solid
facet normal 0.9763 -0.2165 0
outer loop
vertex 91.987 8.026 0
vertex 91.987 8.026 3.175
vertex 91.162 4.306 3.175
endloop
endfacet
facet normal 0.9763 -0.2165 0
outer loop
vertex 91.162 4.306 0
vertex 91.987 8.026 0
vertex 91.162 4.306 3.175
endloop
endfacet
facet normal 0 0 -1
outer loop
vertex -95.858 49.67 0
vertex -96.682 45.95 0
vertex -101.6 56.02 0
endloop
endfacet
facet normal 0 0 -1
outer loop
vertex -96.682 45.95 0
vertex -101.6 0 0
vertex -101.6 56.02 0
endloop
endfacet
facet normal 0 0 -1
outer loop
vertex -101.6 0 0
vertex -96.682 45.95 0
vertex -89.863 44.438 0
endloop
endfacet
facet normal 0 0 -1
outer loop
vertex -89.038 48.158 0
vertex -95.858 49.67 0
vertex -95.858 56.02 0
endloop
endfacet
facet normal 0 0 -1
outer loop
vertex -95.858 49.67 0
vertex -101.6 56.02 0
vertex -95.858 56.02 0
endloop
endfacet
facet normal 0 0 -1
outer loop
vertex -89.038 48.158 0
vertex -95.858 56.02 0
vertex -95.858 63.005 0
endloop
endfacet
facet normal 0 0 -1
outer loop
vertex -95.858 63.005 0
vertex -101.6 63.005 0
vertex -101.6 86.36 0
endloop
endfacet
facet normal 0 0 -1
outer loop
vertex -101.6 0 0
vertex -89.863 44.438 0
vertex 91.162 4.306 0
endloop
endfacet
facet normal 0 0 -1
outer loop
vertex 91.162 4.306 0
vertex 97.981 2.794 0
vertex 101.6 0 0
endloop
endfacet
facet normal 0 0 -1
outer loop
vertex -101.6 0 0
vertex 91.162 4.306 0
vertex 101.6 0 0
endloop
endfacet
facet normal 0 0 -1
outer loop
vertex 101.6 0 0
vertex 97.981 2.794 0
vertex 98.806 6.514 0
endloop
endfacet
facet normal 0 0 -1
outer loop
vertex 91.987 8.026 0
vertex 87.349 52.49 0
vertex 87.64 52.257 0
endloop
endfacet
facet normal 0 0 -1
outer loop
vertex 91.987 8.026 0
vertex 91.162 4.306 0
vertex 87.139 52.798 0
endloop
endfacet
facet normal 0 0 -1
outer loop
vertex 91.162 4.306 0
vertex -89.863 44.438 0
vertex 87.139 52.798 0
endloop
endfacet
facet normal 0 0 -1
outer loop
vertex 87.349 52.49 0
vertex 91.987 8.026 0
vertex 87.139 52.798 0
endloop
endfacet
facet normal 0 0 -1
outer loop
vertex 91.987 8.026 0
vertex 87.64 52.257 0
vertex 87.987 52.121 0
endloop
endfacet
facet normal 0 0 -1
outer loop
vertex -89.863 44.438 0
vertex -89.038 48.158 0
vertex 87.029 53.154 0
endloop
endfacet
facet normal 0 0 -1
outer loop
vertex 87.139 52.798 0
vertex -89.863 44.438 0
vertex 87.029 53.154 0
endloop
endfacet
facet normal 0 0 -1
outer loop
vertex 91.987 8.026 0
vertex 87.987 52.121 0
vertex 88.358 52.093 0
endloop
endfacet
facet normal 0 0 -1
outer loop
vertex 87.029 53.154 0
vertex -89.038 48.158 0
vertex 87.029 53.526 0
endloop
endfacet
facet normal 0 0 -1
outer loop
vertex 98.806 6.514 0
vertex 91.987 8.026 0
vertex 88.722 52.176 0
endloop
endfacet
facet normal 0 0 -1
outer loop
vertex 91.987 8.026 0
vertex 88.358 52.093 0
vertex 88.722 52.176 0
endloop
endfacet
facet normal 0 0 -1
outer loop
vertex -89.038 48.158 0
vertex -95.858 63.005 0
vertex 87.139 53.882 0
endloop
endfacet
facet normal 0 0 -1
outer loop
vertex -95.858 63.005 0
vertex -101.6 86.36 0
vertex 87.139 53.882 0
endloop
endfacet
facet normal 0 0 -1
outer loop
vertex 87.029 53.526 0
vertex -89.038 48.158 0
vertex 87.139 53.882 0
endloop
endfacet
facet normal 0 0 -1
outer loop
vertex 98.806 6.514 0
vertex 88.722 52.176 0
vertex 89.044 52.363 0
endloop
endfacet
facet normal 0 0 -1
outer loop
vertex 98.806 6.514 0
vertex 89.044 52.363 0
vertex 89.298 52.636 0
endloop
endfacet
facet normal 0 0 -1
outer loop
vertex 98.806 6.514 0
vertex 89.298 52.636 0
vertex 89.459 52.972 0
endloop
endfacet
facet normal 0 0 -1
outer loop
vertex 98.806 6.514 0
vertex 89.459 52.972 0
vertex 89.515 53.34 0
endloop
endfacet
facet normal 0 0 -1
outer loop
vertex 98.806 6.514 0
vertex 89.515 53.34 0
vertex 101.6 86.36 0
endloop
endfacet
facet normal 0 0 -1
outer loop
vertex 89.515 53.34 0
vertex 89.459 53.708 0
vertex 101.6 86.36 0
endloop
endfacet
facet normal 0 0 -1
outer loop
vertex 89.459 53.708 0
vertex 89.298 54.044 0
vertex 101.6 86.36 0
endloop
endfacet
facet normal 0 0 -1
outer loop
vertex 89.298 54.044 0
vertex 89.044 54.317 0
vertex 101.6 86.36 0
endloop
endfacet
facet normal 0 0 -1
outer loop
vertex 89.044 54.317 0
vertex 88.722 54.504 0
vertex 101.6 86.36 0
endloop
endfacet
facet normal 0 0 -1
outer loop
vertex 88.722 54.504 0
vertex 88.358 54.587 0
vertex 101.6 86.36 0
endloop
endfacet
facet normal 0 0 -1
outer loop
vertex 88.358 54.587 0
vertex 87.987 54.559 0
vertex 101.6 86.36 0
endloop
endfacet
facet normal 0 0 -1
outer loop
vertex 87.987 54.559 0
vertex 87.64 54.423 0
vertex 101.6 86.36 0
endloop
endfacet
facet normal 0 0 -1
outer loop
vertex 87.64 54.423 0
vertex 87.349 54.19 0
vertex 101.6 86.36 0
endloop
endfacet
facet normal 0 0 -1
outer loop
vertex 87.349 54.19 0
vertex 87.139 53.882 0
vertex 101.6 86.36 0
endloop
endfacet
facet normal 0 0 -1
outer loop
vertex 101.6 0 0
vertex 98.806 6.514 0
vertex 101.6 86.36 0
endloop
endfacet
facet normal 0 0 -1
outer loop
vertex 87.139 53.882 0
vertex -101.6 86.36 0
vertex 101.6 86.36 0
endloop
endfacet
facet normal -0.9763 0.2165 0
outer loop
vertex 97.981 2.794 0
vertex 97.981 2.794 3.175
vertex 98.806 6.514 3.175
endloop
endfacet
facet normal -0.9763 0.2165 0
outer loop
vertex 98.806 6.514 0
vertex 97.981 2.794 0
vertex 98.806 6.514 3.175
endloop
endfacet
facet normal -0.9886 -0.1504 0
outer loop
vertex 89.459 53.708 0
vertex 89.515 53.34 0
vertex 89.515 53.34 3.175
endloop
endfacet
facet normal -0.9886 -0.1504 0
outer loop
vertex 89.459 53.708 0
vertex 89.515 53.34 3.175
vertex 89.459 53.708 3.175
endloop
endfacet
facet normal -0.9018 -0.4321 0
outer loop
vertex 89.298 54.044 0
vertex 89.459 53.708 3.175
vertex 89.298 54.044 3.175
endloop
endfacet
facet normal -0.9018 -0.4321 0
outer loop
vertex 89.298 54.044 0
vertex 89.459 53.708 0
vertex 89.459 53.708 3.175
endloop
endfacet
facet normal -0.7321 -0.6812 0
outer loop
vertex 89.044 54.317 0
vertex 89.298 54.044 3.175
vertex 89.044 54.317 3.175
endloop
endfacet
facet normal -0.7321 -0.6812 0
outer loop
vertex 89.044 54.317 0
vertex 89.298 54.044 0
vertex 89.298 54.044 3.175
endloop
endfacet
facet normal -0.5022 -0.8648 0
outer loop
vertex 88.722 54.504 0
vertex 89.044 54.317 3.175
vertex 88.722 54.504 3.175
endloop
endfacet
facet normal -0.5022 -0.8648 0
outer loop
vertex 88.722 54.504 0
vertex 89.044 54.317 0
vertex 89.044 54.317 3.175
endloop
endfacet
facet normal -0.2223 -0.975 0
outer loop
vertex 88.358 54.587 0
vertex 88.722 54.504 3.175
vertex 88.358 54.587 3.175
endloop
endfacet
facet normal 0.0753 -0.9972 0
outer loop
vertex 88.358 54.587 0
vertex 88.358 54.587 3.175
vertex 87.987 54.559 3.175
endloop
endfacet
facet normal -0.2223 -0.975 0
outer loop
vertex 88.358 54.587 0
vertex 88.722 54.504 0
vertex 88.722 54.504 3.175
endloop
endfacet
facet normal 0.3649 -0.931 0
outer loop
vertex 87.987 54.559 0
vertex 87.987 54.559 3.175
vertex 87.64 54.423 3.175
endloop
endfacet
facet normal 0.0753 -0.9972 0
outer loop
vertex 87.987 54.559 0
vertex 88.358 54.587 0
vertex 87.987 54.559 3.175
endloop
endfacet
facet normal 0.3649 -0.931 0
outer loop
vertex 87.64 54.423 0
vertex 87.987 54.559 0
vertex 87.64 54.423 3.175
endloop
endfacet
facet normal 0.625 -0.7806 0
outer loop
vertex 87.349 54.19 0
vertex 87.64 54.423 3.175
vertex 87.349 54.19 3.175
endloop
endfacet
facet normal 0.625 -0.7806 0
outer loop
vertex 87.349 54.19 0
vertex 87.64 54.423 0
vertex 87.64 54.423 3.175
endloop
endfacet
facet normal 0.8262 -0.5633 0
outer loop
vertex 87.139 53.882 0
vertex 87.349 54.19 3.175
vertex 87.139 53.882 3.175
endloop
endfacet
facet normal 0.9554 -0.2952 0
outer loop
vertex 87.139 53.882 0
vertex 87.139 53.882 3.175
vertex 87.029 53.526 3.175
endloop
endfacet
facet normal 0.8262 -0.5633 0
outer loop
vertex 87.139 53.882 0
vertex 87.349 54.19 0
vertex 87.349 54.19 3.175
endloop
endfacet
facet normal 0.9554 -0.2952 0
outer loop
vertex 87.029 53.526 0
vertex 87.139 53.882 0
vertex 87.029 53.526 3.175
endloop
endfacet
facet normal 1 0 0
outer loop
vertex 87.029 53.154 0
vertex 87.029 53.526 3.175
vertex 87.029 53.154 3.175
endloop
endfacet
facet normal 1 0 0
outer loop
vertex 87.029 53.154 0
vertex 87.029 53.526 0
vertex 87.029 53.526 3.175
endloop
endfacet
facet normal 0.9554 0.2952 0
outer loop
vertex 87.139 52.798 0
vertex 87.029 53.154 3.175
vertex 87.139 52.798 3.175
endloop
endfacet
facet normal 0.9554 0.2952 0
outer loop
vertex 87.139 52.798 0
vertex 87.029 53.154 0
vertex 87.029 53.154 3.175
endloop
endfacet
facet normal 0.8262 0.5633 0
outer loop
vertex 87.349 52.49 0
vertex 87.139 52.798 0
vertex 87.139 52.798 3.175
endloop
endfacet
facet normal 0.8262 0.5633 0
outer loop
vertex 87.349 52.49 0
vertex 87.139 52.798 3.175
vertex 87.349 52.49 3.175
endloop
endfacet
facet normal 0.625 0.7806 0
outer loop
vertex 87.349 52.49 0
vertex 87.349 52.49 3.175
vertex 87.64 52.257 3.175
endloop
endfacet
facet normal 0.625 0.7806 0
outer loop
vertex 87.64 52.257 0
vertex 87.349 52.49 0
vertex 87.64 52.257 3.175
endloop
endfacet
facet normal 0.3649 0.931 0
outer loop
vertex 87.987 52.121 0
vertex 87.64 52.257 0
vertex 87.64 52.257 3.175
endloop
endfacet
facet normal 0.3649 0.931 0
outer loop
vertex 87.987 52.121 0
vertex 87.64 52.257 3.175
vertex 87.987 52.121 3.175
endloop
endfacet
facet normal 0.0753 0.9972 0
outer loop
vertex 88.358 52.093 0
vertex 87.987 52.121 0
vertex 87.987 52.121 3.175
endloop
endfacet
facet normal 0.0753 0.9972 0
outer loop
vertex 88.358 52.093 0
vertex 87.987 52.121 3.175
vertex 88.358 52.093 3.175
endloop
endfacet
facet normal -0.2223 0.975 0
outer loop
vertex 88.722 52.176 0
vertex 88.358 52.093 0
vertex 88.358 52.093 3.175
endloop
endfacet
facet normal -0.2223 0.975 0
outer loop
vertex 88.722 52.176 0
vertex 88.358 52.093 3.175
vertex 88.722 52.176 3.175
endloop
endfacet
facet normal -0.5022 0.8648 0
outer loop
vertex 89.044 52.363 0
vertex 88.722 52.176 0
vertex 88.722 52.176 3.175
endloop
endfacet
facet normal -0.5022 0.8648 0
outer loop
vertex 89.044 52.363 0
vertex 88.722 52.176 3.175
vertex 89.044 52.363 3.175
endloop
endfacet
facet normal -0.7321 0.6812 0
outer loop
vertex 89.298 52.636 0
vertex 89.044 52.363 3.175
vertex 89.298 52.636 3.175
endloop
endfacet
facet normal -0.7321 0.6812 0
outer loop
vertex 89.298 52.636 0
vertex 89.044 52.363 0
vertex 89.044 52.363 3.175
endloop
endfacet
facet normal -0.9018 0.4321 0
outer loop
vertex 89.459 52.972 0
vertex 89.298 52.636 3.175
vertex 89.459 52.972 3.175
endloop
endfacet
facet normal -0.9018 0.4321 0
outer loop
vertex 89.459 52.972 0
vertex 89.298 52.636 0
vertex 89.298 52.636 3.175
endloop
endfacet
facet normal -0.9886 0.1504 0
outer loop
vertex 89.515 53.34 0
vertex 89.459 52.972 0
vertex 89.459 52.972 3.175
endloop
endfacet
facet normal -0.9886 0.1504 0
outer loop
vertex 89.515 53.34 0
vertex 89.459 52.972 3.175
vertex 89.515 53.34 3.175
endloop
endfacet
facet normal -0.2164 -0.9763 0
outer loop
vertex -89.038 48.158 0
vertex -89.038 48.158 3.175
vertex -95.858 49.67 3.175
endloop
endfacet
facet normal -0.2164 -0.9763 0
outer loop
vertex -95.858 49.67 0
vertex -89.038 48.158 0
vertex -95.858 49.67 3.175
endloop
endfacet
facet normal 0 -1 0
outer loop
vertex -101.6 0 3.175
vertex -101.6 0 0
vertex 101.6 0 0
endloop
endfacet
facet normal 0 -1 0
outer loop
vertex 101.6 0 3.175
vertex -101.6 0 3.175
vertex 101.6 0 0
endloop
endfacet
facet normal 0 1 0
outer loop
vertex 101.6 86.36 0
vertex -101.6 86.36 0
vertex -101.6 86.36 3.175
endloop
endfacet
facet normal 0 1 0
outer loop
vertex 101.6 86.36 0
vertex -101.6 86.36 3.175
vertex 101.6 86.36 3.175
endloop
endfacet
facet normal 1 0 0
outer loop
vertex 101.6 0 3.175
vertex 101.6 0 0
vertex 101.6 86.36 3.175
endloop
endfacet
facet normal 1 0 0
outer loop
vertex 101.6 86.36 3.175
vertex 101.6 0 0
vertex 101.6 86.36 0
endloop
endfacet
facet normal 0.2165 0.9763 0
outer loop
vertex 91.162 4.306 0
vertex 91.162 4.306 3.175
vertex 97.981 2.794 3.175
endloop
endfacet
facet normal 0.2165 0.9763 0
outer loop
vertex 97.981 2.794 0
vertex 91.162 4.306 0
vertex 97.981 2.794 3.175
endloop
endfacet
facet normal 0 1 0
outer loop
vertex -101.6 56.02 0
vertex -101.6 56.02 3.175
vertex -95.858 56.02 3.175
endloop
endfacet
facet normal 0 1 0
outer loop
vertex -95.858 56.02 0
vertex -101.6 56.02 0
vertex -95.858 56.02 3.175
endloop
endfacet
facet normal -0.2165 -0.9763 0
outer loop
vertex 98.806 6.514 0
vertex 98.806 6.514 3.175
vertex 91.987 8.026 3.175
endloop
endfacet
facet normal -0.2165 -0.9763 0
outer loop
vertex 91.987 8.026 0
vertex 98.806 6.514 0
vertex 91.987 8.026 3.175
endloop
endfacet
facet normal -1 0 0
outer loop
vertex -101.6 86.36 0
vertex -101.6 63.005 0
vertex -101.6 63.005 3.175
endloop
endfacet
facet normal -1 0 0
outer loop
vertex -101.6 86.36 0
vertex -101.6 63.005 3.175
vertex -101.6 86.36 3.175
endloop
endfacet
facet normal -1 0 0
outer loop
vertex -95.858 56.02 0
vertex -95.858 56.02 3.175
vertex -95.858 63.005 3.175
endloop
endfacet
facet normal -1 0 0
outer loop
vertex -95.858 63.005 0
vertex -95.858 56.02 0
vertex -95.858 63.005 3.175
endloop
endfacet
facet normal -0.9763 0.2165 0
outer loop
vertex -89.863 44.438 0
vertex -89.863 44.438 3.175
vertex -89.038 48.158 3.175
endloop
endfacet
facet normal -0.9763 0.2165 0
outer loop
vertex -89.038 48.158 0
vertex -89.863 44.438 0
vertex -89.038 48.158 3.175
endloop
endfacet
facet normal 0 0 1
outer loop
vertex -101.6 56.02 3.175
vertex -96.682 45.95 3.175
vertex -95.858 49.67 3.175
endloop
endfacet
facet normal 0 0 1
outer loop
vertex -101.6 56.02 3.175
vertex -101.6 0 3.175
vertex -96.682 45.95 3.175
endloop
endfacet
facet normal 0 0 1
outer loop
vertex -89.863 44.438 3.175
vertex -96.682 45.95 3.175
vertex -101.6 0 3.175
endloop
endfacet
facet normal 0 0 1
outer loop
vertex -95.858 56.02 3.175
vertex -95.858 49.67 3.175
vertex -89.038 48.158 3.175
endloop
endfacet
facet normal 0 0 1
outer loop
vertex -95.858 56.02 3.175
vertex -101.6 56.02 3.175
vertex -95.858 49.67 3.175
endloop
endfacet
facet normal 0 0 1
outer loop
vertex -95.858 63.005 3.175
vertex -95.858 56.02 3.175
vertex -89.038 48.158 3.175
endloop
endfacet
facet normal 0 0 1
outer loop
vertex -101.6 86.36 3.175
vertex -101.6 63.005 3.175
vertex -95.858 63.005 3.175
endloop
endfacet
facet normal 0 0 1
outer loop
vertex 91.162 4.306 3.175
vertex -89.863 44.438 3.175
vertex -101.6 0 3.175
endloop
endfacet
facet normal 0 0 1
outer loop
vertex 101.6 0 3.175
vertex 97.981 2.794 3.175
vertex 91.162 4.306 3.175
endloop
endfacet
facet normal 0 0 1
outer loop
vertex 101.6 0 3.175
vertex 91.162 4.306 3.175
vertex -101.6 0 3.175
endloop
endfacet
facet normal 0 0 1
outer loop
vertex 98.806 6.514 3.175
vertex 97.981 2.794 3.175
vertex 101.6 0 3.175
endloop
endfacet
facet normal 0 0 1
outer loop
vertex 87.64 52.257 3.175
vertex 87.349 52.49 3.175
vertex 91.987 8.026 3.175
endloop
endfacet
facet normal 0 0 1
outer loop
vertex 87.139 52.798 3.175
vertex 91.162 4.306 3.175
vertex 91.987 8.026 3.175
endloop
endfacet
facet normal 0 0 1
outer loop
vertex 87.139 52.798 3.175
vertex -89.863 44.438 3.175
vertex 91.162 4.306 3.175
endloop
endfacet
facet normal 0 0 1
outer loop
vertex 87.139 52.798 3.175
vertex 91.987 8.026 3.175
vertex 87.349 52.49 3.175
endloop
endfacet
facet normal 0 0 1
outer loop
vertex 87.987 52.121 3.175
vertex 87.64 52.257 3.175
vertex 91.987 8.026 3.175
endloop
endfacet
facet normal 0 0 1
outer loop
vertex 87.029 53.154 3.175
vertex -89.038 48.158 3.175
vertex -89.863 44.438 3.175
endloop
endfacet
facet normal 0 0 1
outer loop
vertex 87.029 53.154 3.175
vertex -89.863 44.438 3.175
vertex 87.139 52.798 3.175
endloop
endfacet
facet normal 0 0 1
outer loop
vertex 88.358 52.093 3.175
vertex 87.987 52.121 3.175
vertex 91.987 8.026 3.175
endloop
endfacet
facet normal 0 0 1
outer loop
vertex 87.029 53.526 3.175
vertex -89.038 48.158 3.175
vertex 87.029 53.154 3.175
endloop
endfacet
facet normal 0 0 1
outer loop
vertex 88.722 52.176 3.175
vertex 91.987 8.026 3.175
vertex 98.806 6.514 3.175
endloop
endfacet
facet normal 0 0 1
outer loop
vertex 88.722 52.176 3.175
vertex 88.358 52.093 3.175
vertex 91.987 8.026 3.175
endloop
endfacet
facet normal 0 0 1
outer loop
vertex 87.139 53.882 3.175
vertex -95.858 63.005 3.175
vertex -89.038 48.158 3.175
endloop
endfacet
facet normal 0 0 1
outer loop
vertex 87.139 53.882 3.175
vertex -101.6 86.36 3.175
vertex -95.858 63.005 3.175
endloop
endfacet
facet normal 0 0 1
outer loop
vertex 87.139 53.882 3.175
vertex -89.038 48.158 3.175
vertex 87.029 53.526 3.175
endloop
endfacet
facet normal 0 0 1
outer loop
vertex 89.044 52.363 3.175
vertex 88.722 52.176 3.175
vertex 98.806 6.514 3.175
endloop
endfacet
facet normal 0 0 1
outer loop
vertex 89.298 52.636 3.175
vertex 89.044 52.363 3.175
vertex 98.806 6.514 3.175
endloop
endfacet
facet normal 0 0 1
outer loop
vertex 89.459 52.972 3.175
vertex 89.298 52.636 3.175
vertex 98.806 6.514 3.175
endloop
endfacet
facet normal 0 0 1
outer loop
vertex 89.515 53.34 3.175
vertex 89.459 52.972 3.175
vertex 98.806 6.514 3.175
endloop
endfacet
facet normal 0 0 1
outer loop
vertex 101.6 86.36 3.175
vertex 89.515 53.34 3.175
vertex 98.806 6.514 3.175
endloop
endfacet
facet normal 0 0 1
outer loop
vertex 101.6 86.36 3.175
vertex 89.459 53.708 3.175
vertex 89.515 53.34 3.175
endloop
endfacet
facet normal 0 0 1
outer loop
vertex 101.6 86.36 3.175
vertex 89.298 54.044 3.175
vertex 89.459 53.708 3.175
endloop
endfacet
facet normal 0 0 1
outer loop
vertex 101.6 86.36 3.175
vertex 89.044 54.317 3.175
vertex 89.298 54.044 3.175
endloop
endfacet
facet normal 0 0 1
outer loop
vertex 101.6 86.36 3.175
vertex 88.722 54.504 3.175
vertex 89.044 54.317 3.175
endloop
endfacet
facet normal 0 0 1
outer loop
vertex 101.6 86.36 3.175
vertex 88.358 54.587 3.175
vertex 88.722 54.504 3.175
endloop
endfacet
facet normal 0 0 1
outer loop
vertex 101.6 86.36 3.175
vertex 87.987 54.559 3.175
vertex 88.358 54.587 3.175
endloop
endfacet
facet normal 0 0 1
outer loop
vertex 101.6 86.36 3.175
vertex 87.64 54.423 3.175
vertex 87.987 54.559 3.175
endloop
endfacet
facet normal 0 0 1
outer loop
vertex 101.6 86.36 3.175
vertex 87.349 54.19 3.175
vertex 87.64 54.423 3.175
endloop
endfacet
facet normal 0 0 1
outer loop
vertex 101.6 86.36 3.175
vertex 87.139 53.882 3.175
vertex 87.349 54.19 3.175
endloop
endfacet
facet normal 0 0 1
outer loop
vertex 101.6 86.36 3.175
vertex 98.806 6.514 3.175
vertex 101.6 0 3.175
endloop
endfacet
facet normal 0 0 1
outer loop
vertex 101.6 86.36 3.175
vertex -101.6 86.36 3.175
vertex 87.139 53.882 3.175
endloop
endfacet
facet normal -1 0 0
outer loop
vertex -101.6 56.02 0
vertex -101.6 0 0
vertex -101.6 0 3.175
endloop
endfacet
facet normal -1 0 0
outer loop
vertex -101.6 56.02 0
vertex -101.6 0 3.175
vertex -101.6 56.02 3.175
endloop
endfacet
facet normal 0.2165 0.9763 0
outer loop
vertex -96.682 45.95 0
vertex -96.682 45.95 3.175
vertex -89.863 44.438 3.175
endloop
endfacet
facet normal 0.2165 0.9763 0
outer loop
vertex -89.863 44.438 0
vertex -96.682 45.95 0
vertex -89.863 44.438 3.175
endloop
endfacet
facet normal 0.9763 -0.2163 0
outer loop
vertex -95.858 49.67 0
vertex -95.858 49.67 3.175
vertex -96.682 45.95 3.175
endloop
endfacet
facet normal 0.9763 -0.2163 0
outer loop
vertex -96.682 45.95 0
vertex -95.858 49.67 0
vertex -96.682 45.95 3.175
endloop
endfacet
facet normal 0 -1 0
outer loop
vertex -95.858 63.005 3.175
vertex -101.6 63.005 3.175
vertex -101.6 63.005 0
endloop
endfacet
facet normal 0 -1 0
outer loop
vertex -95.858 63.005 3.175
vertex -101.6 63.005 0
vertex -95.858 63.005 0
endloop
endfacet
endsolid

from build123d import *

# Parameters (mm, degrees)
SKETCH1_W           = 203.2
SKETCH1_H           = 86.36
SKETCH1_R           = 1.25
BOSS_EXTRUDE1_DEPTH = 3.175
CUT_EXTRUDE1_DEPTH  = 134.381746221
LPATTERN1_COUNT     = 2
LPATTERN1_PITCH     = 192.405
SKETCH4_W           = 5.74233914
SKETCH4_H           = 6.985
CUT_EXTRUDE2_DEPTH  = 134.381746221


with BuildPart() as part:
    # Sketch1 → Boss-Extrude1 (new body)
    with BuildSketch(Plane.XY):
        with Locations((0, 43.18)):
            Rectangle(SKETCH1_W, SKETCH1_H)
        with Locations((88.265, 53.34)):
            Circle(SKETCH1_R, mode=Mode.SUBTRACT)
    extrude(amount=BOSS_EXTRUDE1_DEPTH)

    # Sketch3 → Cut-Extrude1 (cut, through all)
    with BuildSketch(Plane.XY.offset(3.175)):
        Polygon((91.98657239, 8.02551849), (91.161937461, 4.305830703), (97.981365071, 2.794), (98.806, 6.513687787), align=None)
    cut_extrude1 = extrude(amount=-CUT_EXTRUDE1_DEPTH, mode=Mode.SUBTRACT)

    # LPattern1: Cut-Extrude1 ×2
    with Locations(*[Vector(-0.9762960071199333, 0.21643961393810354, 0) * (i * LPATTERN1_PITCH) for i in range(1, LPATTERN1_COUNT)]):
        add(cut_extrude1, mode=Mode.SUBTRACT)

    # Sketch4 → Cut-Extrude2 (cut, through all)
    with BuildSketch(Plane.XY.offset(3.175)):
        with Locations((-98.72883043, 59.51208241)):
            Rectangle(SKETCH4_W, SKETCH4_H)
    extrude(amount=-CUT_EXTRUDE2_DEPTH, mode=Mode.SUBTRACT)


solid = part.part
